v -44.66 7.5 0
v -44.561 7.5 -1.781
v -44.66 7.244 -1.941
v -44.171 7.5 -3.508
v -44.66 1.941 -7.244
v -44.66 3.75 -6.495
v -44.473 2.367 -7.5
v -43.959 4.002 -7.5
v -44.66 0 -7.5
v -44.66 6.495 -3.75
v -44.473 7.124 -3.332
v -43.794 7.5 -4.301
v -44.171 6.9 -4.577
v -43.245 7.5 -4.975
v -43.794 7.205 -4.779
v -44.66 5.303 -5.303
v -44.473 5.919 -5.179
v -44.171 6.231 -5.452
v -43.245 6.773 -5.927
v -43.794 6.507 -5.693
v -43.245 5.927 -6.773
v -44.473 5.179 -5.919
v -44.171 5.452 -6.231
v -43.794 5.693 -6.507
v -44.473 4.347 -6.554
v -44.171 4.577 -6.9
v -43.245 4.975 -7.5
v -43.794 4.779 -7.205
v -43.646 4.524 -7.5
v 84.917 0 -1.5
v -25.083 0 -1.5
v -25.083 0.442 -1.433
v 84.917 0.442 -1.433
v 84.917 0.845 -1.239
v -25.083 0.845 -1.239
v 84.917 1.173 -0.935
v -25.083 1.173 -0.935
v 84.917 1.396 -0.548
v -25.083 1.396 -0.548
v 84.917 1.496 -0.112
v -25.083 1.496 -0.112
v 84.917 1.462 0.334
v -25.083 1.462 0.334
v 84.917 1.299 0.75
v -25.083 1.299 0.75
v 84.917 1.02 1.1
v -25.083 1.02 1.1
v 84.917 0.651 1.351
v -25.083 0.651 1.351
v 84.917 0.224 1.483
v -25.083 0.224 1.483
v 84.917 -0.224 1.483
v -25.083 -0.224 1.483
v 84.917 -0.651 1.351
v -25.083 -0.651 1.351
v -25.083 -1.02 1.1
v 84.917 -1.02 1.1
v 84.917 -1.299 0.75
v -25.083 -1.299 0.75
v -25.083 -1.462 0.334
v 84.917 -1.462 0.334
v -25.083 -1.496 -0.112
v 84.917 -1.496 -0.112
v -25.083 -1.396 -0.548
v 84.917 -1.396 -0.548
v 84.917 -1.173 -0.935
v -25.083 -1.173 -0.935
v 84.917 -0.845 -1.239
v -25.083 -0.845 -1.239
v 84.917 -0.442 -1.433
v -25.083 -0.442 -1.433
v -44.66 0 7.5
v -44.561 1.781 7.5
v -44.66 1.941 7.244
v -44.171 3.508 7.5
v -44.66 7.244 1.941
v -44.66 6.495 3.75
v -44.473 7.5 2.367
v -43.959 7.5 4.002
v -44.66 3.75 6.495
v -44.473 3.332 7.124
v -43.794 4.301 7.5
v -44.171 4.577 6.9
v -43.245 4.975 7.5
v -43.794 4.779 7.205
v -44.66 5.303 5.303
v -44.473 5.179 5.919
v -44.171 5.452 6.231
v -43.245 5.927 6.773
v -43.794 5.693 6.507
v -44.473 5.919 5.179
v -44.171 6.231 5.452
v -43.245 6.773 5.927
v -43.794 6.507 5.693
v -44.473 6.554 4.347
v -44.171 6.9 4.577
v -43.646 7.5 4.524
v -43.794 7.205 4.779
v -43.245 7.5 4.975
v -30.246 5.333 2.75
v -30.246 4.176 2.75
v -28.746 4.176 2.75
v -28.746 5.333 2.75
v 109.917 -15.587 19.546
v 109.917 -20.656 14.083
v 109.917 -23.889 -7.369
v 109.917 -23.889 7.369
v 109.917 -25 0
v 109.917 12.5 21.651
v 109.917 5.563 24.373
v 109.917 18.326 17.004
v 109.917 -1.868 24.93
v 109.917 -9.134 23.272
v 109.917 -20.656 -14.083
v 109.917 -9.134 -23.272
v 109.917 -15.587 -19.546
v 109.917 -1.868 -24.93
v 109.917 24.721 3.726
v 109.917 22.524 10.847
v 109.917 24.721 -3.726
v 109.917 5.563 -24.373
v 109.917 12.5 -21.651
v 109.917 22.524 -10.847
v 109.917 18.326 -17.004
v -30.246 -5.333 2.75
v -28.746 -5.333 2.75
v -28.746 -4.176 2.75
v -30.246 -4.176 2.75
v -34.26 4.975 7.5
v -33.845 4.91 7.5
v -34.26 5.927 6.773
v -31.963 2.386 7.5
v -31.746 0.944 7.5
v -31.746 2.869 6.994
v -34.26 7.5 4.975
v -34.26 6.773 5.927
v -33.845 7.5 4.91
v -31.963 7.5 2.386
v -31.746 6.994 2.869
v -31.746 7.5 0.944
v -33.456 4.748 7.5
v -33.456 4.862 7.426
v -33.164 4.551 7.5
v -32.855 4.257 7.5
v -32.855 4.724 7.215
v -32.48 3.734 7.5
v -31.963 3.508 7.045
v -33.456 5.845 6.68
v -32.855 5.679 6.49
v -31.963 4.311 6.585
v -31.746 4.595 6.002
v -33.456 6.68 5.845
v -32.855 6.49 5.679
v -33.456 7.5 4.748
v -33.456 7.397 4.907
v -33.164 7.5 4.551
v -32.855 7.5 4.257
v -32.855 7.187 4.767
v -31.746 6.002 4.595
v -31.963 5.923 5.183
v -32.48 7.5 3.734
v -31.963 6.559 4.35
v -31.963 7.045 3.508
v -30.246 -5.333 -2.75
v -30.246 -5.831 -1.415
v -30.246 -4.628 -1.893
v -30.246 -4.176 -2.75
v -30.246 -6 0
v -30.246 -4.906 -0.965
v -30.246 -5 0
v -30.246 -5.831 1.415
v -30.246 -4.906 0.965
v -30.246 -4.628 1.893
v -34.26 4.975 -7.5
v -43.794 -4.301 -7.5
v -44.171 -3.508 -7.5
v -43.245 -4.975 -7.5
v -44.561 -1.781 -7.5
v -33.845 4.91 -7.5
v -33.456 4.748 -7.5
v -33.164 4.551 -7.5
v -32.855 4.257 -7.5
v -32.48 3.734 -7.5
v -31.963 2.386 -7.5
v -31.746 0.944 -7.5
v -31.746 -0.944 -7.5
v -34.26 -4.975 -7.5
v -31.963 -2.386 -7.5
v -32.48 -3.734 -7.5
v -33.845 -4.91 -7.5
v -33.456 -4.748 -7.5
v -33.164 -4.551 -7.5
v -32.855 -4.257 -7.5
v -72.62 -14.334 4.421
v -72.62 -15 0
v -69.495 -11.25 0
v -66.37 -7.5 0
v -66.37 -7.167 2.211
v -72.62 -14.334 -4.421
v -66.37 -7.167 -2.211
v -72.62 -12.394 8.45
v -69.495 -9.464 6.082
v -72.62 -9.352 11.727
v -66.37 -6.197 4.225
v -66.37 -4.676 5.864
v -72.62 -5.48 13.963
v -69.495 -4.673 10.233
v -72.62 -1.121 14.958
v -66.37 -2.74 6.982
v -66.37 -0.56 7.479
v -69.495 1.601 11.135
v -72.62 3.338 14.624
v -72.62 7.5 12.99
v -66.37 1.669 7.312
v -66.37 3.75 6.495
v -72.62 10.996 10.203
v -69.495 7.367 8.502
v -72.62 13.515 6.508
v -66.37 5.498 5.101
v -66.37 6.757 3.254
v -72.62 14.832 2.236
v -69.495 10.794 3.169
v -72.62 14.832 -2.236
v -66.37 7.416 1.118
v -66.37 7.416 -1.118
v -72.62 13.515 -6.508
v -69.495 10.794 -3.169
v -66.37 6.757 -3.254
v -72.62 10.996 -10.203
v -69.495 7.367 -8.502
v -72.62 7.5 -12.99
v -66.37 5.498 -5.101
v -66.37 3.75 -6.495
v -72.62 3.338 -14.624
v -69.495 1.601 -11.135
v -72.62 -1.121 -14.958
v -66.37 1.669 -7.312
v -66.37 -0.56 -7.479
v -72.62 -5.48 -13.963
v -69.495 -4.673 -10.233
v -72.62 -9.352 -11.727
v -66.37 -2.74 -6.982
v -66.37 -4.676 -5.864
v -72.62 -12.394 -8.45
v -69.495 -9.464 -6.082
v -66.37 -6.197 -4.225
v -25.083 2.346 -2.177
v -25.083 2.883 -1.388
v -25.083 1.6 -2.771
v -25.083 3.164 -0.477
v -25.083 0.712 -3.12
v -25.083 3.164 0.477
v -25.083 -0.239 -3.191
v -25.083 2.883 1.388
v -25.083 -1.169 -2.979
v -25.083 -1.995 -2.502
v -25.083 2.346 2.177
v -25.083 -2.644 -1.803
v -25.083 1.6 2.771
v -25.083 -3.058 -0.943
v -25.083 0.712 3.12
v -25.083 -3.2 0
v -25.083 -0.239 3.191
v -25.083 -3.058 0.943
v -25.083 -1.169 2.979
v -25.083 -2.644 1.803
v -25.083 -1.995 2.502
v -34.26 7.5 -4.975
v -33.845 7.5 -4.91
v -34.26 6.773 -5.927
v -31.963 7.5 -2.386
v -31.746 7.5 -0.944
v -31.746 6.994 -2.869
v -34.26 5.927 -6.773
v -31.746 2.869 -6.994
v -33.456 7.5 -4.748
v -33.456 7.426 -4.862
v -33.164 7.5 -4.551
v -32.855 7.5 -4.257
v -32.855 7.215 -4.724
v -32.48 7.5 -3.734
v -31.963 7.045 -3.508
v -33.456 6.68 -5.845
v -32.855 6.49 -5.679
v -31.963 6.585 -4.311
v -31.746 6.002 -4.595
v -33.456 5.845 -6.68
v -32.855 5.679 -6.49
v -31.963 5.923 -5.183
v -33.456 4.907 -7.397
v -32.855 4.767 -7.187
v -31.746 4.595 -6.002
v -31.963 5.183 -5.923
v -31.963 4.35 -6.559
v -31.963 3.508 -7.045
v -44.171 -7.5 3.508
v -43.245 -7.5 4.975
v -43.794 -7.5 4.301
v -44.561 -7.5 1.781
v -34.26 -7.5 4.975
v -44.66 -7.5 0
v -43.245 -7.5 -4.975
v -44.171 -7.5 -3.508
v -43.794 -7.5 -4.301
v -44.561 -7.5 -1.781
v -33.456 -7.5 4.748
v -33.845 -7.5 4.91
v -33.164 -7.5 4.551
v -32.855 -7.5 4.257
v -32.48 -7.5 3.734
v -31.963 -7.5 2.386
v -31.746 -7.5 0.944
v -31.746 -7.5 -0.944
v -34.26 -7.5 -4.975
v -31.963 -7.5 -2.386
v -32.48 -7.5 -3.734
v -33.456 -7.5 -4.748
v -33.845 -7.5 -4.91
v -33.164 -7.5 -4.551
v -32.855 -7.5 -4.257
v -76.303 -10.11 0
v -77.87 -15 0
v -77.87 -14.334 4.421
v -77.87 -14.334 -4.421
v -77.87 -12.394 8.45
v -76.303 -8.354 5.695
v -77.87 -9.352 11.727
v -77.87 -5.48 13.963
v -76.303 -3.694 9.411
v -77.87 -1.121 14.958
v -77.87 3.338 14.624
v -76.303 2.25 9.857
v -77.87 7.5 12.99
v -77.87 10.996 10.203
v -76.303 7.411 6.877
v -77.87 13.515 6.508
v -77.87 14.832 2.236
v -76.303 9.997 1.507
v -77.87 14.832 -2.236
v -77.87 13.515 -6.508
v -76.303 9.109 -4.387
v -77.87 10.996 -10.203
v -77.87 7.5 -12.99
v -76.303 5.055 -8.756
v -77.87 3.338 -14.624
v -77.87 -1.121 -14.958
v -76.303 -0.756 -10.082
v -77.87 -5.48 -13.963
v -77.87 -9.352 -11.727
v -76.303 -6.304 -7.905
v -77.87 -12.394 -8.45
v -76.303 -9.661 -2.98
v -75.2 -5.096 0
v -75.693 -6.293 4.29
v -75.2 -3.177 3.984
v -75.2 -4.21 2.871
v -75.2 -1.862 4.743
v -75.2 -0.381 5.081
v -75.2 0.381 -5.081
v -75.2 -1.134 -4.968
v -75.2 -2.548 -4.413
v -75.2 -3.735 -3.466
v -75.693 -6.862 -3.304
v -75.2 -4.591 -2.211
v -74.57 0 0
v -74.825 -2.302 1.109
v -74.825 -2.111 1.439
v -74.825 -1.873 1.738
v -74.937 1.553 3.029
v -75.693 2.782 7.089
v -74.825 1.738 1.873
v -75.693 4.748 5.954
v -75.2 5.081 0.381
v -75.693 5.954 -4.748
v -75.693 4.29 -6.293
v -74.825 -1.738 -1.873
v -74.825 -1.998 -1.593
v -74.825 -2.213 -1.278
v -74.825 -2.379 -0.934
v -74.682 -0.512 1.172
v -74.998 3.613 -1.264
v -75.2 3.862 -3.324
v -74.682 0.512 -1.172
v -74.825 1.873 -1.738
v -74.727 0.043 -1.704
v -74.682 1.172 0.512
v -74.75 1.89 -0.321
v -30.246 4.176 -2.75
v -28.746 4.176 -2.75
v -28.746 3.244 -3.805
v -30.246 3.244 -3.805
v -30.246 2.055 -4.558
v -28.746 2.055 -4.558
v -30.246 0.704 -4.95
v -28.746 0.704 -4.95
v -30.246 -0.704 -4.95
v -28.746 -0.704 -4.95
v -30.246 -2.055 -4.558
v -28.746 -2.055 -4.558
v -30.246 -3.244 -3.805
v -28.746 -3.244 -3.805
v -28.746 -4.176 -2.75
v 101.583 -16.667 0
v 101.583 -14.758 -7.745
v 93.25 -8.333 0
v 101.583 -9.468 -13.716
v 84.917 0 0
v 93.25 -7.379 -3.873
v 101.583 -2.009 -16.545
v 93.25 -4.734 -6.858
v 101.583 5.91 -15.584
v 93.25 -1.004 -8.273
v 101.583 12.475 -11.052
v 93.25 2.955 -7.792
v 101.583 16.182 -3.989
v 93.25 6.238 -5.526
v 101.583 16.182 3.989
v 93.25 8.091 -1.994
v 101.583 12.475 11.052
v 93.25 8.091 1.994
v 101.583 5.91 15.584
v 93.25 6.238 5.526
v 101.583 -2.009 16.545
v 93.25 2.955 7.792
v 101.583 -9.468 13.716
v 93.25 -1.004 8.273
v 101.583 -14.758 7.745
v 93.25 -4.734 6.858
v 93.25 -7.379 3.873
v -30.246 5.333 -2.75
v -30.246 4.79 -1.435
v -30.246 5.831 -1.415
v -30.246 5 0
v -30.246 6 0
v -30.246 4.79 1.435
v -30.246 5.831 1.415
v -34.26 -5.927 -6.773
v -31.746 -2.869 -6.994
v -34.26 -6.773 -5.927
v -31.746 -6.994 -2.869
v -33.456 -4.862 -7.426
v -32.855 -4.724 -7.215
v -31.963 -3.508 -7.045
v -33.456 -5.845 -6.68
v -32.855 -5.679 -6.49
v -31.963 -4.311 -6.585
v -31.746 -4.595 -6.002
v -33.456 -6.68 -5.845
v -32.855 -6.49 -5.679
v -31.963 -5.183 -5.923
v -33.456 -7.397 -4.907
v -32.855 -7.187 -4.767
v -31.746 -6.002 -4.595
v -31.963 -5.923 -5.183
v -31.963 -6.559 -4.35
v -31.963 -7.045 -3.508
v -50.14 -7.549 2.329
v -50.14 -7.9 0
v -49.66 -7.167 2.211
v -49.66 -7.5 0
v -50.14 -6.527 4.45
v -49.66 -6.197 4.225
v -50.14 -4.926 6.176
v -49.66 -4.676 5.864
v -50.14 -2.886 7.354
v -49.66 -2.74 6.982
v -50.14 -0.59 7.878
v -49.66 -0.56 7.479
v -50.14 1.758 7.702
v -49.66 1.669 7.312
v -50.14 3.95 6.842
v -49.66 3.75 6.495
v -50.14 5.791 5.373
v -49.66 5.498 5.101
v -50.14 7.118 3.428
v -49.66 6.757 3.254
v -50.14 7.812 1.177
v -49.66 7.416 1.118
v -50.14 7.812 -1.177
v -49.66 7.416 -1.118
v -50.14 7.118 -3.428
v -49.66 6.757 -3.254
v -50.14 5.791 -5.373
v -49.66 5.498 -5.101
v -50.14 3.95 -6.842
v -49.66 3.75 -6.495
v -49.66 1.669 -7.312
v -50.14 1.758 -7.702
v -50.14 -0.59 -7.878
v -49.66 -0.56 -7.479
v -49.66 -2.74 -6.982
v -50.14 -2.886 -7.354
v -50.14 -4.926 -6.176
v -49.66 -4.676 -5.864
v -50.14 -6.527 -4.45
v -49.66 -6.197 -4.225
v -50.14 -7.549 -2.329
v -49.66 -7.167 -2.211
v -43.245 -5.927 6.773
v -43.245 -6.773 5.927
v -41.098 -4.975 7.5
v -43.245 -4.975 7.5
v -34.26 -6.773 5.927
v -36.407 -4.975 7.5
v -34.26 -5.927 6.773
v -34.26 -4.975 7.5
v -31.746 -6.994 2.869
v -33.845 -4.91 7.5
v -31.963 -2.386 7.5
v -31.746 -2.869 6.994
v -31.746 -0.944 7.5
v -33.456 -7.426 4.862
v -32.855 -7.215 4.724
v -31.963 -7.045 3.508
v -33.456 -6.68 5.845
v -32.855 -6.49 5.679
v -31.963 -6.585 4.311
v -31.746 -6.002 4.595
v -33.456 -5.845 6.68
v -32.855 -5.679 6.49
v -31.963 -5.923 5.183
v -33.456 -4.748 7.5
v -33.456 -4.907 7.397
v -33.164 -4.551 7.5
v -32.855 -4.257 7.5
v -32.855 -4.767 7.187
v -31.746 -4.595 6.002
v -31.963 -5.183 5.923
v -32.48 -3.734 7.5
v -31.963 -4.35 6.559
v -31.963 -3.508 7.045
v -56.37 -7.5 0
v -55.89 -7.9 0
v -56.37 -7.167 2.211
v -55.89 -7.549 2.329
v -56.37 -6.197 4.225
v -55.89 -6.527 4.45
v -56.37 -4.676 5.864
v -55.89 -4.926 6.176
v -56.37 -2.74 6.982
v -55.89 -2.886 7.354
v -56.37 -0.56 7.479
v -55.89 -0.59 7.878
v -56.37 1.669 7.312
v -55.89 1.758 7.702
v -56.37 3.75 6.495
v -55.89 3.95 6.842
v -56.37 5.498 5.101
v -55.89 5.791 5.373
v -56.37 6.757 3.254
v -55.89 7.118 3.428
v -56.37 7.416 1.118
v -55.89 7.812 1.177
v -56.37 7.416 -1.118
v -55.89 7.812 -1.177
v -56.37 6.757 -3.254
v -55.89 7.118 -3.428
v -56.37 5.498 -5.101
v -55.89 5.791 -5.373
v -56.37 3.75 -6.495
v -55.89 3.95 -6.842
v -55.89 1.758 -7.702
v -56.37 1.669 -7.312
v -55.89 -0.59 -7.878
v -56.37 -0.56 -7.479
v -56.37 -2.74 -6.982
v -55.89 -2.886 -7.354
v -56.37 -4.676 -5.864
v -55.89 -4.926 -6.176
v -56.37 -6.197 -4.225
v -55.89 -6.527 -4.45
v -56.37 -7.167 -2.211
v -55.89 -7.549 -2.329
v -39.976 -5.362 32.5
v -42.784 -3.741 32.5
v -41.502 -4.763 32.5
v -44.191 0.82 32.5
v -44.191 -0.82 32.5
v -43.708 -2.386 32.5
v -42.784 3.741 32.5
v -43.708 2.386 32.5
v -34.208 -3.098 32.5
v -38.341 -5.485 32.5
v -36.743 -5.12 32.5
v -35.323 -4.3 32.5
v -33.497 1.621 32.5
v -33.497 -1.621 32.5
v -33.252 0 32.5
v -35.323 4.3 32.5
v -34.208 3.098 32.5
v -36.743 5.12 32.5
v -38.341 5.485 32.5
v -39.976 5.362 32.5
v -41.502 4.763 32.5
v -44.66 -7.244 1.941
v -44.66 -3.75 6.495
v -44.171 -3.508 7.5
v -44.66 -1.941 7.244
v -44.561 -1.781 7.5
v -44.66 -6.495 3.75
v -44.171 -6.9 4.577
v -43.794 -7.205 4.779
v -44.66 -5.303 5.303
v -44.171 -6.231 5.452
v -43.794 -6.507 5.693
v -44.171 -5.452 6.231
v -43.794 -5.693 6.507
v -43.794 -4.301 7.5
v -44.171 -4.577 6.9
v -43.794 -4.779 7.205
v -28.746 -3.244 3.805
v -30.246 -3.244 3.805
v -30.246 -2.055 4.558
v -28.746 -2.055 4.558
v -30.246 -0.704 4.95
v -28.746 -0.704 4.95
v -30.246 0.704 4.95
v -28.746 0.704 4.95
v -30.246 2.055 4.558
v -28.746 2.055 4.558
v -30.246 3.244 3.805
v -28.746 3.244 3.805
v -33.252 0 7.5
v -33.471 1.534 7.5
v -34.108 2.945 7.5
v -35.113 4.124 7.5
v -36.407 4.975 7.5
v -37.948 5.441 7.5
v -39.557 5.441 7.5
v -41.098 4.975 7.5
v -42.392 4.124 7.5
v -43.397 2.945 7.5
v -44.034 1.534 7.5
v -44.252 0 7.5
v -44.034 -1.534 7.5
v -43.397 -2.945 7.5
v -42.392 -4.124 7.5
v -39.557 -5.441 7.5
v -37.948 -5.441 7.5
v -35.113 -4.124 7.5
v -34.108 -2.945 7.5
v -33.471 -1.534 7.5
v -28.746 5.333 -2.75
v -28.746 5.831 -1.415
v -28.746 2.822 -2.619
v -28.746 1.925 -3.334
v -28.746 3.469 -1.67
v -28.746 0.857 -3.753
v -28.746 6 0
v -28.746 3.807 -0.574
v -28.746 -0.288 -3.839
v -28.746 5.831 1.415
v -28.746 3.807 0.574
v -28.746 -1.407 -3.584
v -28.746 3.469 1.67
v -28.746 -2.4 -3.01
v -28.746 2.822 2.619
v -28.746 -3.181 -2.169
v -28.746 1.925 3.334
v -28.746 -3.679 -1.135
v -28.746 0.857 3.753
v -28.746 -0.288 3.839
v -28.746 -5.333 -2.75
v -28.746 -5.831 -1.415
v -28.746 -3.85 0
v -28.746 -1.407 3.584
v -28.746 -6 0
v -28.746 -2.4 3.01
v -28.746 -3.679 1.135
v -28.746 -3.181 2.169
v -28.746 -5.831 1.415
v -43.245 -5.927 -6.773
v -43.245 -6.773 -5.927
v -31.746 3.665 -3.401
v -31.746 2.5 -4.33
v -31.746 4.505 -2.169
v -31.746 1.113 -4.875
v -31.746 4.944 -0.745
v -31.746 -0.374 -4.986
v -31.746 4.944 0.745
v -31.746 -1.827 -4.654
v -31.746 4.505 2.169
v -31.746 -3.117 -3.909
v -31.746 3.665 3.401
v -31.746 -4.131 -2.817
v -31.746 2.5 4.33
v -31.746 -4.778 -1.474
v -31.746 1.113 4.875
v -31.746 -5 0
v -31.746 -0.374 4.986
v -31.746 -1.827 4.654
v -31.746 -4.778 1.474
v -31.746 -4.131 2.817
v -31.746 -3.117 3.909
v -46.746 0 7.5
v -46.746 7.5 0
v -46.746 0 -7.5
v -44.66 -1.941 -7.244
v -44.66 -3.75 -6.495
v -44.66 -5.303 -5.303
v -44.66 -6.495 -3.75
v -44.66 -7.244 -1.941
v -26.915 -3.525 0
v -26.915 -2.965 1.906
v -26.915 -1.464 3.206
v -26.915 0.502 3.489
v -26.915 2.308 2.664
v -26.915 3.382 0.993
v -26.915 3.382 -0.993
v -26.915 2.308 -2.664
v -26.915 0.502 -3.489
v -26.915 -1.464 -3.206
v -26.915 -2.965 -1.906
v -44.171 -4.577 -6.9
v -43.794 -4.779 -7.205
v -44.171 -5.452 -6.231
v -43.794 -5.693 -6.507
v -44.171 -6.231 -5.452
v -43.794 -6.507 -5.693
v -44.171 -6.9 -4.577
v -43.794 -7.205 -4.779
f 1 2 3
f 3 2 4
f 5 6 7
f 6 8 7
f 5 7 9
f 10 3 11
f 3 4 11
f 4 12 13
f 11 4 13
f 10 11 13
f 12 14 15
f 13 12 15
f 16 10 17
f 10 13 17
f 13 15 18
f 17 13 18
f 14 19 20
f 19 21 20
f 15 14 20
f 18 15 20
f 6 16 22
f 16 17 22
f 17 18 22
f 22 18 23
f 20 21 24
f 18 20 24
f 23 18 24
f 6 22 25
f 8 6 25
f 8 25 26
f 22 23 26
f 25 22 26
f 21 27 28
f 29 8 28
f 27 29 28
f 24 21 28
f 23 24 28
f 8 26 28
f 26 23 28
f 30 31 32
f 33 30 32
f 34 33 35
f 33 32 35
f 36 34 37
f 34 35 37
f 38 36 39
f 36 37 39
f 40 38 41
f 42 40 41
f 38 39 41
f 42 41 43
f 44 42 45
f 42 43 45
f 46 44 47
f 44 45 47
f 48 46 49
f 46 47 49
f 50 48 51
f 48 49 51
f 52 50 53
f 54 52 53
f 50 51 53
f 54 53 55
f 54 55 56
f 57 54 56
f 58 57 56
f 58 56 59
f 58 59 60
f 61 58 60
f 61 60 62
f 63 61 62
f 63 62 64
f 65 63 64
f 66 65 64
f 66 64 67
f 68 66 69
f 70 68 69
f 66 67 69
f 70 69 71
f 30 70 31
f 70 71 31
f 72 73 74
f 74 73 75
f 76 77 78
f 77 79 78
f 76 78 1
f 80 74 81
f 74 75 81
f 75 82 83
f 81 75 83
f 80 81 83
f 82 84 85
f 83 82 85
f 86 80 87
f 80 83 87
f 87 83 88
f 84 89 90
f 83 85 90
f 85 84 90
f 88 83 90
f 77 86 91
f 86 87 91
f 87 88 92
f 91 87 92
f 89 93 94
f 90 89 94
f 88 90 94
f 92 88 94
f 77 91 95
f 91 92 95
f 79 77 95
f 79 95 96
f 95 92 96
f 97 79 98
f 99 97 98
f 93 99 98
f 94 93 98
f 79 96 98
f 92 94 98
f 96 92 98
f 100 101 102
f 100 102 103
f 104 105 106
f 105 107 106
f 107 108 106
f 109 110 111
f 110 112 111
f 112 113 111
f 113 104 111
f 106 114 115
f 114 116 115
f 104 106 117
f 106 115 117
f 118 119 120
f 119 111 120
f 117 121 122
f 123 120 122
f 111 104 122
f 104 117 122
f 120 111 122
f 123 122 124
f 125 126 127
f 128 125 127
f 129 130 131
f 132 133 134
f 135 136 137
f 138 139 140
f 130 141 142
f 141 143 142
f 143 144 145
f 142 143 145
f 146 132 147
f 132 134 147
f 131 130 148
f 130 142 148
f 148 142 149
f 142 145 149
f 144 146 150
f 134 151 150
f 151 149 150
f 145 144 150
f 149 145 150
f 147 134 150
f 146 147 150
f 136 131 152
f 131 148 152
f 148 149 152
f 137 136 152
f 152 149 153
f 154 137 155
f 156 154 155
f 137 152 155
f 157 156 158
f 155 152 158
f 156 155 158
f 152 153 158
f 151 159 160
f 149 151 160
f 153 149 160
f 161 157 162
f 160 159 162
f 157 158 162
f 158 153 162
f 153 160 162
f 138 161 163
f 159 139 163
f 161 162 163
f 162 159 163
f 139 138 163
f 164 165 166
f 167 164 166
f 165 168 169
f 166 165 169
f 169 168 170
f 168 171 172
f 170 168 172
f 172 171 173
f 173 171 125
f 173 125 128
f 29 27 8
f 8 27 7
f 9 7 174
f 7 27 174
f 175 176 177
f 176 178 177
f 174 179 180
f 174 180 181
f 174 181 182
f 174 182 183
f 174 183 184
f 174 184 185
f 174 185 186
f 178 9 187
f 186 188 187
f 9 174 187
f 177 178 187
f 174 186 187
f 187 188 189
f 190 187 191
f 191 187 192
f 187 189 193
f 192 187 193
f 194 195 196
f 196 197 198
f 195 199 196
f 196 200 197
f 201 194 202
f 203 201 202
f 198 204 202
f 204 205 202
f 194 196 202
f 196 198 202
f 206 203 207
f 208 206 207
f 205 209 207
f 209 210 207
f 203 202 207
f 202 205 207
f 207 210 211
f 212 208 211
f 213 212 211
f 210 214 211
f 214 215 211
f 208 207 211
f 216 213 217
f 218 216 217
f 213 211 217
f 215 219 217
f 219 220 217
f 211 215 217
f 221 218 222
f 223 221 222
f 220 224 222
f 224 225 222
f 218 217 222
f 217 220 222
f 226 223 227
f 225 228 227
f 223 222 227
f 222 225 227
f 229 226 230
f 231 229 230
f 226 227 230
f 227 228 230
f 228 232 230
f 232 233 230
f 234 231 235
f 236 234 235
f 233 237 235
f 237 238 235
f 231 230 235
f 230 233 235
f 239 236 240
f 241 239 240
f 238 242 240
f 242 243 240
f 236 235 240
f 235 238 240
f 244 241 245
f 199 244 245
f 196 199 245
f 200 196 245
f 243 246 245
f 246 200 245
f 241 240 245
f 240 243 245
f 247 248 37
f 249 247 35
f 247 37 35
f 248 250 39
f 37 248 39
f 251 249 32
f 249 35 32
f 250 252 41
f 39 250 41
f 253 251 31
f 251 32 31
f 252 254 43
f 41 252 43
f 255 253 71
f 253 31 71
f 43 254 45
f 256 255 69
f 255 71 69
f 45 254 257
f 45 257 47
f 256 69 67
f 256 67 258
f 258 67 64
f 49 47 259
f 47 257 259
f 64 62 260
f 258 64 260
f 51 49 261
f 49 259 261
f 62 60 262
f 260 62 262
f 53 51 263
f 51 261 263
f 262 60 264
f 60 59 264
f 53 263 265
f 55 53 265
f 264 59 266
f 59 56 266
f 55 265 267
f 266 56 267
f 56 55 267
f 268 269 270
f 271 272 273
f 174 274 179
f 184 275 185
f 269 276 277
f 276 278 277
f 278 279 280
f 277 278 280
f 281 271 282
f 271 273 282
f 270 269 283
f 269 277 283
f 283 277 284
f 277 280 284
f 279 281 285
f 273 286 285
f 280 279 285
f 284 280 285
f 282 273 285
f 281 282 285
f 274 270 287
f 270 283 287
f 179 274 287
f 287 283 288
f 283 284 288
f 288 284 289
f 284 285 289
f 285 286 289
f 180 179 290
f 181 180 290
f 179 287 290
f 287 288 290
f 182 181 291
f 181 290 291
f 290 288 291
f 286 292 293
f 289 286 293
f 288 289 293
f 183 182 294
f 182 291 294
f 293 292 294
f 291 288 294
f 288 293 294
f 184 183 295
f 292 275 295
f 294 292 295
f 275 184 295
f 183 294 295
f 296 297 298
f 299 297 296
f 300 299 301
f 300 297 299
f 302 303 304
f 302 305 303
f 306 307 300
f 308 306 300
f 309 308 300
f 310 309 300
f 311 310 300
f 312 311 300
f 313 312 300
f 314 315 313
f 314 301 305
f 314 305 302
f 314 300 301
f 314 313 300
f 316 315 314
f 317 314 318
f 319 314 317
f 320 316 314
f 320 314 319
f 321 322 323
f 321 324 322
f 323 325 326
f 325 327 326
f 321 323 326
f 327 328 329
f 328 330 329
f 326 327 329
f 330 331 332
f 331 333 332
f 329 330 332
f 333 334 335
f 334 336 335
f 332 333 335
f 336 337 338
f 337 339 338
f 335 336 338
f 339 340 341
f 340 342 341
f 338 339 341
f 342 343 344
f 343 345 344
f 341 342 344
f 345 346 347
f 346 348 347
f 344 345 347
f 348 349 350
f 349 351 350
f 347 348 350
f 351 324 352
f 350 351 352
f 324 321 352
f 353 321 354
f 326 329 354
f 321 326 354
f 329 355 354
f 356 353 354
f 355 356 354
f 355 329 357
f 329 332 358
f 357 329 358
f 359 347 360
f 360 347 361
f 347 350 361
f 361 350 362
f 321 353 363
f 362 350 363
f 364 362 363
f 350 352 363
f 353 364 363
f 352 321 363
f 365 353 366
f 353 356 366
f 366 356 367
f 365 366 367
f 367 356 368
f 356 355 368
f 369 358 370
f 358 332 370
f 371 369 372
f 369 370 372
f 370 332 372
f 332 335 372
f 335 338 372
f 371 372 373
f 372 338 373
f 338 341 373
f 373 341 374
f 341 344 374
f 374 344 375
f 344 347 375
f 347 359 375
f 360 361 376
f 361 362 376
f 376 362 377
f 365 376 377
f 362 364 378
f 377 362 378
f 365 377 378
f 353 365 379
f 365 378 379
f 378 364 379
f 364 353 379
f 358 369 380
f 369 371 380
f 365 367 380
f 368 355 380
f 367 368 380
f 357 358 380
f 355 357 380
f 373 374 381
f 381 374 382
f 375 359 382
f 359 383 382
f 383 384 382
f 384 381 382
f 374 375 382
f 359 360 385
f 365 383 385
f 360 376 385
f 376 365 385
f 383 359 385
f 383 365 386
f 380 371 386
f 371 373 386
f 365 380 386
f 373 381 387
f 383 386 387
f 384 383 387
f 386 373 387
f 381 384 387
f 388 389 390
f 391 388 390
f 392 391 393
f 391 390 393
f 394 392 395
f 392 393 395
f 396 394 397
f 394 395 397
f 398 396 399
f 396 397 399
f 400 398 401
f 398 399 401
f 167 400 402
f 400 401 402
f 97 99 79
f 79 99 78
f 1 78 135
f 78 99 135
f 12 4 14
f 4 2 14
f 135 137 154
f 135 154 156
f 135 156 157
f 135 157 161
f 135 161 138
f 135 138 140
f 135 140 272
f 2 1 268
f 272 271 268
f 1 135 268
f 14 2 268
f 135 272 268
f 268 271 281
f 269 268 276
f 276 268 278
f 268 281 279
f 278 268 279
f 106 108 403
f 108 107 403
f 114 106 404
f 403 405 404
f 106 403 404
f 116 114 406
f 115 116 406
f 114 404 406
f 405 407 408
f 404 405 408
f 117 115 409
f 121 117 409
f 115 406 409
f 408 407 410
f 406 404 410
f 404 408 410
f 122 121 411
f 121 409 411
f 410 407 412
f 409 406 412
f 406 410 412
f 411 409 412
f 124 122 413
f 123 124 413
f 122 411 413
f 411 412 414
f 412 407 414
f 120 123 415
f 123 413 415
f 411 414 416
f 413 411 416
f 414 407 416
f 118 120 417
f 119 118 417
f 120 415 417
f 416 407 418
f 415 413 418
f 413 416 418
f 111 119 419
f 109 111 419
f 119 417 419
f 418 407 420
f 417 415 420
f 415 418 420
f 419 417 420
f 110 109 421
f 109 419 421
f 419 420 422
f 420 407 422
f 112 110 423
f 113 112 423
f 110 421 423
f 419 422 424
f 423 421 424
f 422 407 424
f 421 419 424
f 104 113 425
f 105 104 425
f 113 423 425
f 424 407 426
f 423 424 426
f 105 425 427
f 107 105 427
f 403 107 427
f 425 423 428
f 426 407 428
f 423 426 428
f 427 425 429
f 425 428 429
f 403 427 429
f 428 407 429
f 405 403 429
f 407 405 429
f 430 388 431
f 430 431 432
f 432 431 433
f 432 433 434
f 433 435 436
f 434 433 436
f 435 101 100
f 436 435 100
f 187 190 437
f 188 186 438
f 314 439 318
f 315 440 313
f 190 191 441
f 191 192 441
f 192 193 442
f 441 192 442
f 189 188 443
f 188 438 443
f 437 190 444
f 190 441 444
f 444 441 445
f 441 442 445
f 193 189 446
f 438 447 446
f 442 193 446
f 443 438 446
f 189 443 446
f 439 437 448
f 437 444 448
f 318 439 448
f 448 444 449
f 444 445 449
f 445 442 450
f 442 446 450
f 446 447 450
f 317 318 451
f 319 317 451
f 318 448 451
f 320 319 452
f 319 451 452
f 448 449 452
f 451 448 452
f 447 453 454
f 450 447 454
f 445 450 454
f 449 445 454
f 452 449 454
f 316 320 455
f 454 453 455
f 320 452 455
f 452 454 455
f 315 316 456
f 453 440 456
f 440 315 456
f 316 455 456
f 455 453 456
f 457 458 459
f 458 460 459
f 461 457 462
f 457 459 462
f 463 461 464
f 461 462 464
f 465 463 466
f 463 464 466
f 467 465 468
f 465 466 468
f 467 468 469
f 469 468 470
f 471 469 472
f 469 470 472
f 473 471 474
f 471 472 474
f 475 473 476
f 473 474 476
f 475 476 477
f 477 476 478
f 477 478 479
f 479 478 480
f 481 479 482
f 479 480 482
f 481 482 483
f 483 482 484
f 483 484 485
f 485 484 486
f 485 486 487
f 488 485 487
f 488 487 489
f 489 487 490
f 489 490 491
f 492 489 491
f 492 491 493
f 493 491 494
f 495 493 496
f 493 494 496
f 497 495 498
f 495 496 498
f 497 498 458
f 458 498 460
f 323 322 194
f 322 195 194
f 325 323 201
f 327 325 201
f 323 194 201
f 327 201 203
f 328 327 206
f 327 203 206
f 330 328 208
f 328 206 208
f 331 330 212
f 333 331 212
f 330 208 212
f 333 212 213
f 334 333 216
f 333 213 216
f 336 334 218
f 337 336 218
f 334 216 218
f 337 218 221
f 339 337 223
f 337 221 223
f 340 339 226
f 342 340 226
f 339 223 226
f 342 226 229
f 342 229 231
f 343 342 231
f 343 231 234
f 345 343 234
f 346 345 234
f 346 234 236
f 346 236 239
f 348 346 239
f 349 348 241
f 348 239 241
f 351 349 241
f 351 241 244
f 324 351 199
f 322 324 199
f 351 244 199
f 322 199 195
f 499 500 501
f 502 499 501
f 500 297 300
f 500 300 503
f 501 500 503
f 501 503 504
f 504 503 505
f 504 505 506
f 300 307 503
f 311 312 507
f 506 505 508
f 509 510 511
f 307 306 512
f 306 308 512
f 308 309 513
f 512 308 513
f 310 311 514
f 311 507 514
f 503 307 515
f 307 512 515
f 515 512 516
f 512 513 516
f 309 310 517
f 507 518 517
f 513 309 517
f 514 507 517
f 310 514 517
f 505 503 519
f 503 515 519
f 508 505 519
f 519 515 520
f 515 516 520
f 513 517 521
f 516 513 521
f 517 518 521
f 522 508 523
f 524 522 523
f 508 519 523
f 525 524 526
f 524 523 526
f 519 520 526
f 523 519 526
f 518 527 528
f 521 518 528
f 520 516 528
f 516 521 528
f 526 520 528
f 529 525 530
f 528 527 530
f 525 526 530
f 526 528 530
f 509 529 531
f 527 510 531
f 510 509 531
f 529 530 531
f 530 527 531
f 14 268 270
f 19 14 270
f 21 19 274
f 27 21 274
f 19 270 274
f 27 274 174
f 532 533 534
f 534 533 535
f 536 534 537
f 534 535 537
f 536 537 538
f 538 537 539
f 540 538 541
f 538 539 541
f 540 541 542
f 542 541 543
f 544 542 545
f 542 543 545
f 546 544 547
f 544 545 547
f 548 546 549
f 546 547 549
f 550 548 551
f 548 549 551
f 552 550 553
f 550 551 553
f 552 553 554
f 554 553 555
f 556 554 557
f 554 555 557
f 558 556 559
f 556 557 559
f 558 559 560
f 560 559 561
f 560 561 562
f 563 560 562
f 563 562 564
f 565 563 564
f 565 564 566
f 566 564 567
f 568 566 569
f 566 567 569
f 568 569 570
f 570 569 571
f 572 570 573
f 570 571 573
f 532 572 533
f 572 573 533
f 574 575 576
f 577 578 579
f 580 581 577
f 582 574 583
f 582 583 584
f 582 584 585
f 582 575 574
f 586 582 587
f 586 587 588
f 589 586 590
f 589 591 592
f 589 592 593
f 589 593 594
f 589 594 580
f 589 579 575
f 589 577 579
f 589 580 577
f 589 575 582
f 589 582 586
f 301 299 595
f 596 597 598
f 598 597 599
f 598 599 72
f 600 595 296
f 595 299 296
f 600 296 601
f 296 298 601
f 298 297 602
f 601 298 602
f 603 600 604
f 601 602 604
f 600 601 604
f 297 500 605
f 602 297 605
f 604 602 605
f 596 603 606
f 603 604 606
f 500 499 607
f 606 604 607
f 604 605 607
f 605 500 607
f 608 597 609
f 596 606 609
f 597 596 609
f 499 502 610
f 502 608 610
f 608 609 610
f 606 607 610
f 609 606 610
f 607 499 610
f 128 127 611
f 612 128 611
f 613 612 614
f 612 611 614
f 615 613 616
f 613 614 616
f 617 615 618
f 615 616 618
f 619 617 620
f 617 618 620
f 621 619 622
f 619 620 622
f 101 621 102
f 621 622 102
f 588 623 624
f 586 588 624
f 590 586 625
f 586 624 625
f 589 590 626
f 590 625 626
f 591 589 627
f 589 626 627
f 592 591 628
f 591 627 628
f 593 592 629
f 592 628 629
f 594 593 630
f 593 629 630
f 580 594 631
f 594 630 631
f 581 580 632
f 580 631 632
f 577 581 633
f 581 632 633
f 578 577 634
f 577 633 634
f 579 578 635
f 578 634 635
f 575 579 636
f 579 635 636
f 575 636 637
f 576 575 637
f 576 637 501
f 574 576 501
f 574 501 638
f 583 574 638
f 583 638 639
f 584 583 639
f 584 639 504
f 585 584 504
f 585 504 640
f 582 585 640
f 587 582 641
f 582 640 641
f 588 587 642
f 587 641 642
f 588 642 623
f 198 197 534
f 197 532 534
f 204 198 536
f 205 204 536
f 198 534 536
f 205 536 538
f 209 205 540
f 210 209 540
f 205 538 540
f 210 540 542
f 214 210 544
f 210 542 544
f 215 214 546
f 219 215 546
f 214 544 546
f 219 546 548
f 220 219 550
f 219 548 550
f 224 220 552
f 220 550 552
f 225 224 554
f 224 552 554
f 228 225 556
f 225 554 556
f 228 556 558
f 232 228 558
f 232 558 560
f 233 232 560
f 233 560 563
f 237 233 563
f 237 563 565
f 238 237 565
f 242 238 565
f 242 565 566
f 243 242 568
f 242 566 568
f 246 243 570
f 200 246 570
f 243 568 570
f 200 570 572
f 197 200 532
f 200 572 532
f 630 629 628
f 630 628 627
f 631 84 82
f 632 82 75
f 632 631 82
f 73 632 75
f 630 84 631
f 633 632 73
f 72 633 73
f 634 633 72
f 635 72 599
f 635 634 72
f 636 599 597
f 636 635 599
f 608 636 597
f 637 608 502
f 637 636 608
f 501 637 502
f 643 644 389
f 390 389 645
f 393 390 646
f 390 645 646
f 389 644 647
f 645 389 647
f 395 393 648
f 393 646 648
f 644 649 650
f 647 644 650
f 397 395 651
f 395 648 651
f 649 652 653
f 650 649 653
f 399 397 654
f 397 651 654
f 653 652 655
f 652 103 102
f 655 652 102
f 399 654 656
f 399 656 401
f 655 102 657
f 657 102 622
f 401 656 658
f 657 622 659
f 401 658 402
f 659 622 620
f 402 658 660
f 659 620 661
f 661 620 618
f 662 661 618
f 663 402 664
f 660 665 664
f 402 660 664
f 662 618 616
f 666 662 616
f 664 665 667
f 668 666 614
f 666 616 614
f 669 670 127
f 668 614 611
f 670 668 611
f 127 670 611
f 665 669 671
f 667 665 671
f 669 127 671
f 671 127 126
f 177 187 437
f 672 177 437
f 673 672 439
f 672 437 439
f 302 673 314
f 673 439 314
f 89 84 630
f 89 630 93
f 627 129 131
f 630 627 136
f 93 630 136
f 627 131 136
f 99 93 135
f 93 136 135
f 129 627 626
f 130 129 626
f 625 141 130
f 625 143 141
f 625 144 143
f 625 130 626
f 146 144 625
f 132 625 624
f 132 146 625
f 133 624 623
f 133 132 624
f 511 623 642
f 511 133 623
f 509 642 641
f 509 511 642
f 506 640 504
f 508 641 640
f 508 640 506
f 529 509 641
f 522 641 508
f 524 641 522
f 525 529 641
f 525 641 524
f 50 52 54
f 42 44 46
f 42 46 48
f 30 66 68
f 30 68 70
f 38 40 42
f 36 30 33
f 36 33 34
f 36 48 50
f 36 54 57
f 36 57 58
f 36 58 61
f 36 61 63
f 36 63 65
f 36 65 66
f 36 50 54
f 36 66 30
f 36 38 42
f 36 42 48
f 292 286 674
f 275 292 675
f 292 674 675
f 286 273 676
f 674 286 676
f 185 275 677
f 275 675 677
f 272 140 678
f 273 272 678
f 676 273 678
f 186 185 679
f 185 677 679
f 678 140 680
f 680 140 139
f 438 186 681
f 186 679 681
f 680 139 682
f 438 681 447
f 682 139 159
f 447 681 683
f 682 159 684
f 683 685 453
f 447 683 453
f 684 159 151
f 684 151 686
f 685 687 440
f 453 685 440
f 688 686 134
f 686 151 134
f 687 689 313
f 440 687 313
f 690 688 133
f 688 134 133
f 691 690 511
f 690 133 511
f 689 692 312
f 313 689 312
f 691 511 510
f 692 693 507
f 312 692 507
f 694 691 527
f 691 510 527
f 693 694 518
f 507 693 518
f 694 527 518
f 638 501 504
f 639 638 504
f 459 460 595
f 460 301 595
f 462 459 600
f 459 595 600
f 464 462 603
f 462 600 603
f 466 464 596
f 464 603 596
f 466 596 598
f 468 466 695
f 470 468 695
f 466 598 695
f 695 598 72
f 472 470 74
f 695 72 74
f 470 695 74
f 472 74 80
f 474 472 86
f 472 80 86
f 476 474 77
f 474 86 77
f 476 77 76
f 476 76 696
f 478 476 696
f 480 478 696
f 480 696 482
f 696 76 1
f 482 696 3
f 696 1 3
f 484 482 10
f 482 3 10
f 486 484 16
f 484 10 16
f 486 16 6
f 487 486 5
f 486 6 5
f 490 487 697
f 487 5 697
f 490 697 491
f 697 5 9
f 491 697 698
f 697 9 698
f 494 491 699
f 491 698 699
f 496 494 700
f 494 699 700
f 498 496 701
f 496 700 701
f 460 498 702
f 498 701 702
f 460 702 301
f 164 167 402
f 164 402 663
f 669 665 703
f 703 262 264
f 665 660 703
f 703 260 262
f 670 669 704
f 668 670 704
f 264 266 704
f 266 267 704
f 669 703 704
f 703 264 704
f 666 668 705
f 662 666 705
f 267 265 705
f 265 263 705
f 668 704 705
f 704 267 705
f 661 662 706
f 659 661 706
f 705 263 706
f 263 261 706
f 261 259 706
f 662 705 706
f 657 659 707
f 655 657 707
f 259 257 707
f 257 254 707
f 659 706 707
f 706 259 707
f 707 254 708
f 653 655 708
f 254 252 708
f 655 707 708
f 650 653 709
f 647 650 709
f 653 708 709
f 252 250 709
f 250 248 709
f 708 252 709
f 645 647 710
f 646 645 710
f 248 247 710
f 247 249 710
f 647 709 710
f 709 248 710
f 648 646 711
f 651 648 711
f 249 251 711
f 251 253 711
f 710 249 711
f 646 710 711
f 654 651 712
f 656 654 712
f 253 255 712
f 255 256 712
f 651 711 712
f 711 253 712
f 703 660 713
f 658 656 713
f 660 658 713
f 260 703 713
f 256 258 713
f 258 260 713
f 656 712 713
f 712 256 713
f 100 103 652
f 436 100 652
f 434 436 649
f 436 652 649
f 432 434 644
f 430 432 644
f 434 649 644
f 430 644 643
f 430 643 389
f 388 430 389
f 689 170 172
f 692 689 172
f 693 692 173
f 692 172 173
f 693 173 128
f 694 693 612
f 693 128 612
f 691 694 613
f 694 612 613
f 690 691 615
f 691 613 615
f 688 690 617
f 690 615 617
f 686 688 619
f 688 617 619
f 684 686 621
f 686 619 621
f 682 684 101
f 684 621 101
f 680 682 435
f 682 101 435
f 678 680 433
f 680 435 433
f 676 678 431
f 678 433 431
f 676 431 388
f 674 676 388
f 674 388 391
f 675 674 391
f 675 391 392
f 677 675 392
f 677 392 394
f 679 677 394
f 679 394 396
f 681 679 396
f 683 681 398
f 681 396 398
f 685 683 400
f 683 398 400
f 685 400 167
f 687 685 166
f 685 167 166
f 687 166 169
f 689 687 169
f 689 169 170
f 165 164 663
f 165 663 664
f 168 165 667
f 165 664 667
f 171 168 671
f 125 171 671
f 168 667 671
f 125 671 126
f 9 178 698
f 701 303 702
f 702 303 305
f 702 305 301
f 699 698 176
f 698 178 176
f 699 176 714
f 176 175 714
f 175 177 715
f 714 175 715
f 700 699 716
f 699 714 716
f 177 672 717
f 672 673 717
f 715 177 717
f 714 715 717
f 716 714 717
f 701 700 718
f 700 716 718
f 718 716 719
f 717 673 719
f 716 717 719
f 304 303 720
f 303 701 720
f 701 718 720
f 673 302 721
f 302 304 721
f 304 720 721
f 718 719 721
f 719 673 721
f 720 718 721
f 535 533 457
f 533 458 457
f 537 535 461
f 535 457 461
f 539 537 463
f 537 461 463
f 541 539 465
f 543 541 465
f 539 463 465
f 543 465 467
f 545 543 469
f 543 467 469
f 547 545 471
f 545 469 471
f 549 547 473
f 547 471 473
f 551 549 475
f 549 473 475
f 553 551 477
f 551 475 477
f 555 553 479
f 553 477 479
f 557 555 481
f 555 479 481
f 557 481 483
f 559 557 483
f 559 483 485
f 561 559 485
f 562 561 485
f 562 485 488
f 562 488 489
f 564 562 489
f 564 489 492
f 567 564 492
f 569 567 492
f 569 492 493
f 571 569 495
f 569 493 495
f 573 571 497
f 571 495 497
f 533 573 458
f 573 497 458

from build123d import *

# Parameters (mm, degrees)
SKETCH2_W           = 24.86541407
SKETCH2_H           = 5.423229841
SKETCH2_H_2         = 4.001260317
CUT_EXTRUDE1_DEPTH  = 15
CIRPATTERN1_COUNT   = 2
CIRPATTERN1_ANGLE   = 90
CUT_EXTRUDE2_DEPTH  = 1.5
SKETCH4_R           = 5.5
BOSS_EXTRUDE1_DEPTH = 25
SKETCH5_R           = 1.5
BOSS_EXTRUDE2_DEPTH = 110


with BuildPart() as part:
    # Sketch1 → Revolve1 (revolve)
    with BuildSketch(Plane.XY):
        with BuildLine():
            ThreePointArc((-74.569724464, 0), (-75.692690434, -7.615947487), (-77.869724464, -15))
            Line((-77.869724464, -15), (-72.619724464, -15))
            Line((-72.619724464, -15), (-66.369724464, -7.5))
            Line((-66.369724464, -7.5), (-56.369724464, -7.5))
            Line((-56.369724464, -7.5), (-55.889724464, -7.9))
            Line((-55.889724464, -7.9), (-50.139724464, -7.9))
            Line((-50.139724464, -7.9), (-49.659724464, -7.5))
            Line((-49.659724464, -7.5), (-44.659724464, -7.5))
            ThreePointArc((-44.659724464, -7.5), (-44.085344133, -8.375316627), (-43.245187811, -9))
            Line((-43.245187811, -9), (-40.559724464, -9))
            Line((-40.559724464, -9), (-34.259724464, -9))
            ThreePointArc((-34.259724464, -9), (-32.817493666, -8.603076001), (-31.746136172, -7.559154808))
            Line((-31.746136172, -7.559154808), (-31.746136172, -5))
            Line((-31.746136172, -5), (-30.246136172, -5))
            Line((-30.246136172, -5), (-30.246136172, -6))
            Line((-30.246136172, -6), (-28.746136172, -6))
            Line((-28.746136172, -6), (-28.746136172, -3.85))
            Line((-28.746136172, -3.85), (-25.083482145, -3.2))
            Line((-25.083482145, -3.2), (-25.083482145, 0))
            Line((-25.083482145, 0), (-74.569724464, 0))
        make_face()
    revolve(axis=Axis((88.99, 0, 0), (-1, 0, 0)))

    # Sketch2 → Cut-Extrude1 (cut)
    with BuildSketch(Plane(origin=(-31.746136172, 0, 0), x_dir=(0, 0, -1), z_dir=(1, 0, 0))):
        with Locations((0, -10.211614921)):
            Rectangle(SKETCH2_W, SKETCH2_H)
        with Locations((0, 9.500630158)):
            Rectangle(SKETCH2_W, SKETCH2_H_2)
    cut_extrude1 = extrude(amount=-CUT_EXTRUDE1_DEPTH, mode=Mode.SUBTRACT)

    # CirPattern1: Cut-Extrude1 ×2 about axis
    cirpattern1_axis = Axis((88.99, 0, 0), (-1, 0, 0))
    for i in range(1, CIRPATTERN1_COUNT):
        add(cut_extrude1.rotate(cirpattern1_axis, i * CIRPATTERN1_ANGLE / (CIRPATTERN1_COUNT - 1)), mode=Mode.SUBTRACT)

    # Sketch3 → Cut-Extrude2 (cut)
    with BuildSketch(Plane(origin=(-28.746136172, 0, 0), x_dir=(0, 0, -1), z_dir=(1, 0, 0))):
        with BuildLine():
            Line((2.75, -4.175823272), (2.75, -6.437196595))
            Line((2.75, -6.437196595), (5.963766818, -6.437196595))
            Line((5.963766818, -6.437196595), (6.43018781, 6.437196595))
            Line((6.43018781, 6.437196595), (2.75, 6.437196595))
            Line((2.75, 6.437196595), (2.75, 4.175823272))
            ThreePointArc((2.75, 4.175823272), (5, 0), (2.75, -4.175823272))
        make_face()
        with BuildLine():
            Line((-2.75, -6.437196595), (-2.75, -4.175823272))
            ThreePointArc((-2.75, -4.175823272), (-5, 0), (-2.75, 4.175823272))
            Line((-2.75, 4.175823272), (-2.75, 6.437196595))
            Line((-2.75, 6.437196595), (-6.280612264, 6.437196595))
            Line((-6.280612264, 6.437196595), (-6.280612264, -6.437196595))
            Line((-6.280612264, -6.437196595), (-2.75, -6.437196595))
        make_face()
    extrude(amount=-CUT_EXTRUDE2_DEPTH, mode=Mode.SUBTRACT)

    # Sketch4 → Boss-Extrude1 (add)
    with BuildSketch(Plane.XY.offset(7.5)):
        with Locations((-38.752456137, 0)):
            Circle(SKETCH4_R)
    extrude(amount=BOSS_EXTRUDE1_DEPTH)

    # Sketch5 → Boss-Extrude2 (add)
    with BuildSketch(Plane(origin=(-25.083482145, 0, 0), x_dir=(0, 0, -1), z_dir=(1, 0, 0))):
        Circle(SKETCH5_R)
    extrude(amount=BOSS_EXTRUDE2_DEPTH)


with BuildPart() as body_2:
    # Sketch6 → Revolve2 (revolve)
    with BuildSketch(Plane.XY):
        Polygon((84.916517855, 0), (109.916517855, 0), (109.916517855, -25), align=None)
    revolve(axis=Axis((84.916517855, 0, 0), (1, 0, 0)))


solid = Compound([part.part, body_2.part])
